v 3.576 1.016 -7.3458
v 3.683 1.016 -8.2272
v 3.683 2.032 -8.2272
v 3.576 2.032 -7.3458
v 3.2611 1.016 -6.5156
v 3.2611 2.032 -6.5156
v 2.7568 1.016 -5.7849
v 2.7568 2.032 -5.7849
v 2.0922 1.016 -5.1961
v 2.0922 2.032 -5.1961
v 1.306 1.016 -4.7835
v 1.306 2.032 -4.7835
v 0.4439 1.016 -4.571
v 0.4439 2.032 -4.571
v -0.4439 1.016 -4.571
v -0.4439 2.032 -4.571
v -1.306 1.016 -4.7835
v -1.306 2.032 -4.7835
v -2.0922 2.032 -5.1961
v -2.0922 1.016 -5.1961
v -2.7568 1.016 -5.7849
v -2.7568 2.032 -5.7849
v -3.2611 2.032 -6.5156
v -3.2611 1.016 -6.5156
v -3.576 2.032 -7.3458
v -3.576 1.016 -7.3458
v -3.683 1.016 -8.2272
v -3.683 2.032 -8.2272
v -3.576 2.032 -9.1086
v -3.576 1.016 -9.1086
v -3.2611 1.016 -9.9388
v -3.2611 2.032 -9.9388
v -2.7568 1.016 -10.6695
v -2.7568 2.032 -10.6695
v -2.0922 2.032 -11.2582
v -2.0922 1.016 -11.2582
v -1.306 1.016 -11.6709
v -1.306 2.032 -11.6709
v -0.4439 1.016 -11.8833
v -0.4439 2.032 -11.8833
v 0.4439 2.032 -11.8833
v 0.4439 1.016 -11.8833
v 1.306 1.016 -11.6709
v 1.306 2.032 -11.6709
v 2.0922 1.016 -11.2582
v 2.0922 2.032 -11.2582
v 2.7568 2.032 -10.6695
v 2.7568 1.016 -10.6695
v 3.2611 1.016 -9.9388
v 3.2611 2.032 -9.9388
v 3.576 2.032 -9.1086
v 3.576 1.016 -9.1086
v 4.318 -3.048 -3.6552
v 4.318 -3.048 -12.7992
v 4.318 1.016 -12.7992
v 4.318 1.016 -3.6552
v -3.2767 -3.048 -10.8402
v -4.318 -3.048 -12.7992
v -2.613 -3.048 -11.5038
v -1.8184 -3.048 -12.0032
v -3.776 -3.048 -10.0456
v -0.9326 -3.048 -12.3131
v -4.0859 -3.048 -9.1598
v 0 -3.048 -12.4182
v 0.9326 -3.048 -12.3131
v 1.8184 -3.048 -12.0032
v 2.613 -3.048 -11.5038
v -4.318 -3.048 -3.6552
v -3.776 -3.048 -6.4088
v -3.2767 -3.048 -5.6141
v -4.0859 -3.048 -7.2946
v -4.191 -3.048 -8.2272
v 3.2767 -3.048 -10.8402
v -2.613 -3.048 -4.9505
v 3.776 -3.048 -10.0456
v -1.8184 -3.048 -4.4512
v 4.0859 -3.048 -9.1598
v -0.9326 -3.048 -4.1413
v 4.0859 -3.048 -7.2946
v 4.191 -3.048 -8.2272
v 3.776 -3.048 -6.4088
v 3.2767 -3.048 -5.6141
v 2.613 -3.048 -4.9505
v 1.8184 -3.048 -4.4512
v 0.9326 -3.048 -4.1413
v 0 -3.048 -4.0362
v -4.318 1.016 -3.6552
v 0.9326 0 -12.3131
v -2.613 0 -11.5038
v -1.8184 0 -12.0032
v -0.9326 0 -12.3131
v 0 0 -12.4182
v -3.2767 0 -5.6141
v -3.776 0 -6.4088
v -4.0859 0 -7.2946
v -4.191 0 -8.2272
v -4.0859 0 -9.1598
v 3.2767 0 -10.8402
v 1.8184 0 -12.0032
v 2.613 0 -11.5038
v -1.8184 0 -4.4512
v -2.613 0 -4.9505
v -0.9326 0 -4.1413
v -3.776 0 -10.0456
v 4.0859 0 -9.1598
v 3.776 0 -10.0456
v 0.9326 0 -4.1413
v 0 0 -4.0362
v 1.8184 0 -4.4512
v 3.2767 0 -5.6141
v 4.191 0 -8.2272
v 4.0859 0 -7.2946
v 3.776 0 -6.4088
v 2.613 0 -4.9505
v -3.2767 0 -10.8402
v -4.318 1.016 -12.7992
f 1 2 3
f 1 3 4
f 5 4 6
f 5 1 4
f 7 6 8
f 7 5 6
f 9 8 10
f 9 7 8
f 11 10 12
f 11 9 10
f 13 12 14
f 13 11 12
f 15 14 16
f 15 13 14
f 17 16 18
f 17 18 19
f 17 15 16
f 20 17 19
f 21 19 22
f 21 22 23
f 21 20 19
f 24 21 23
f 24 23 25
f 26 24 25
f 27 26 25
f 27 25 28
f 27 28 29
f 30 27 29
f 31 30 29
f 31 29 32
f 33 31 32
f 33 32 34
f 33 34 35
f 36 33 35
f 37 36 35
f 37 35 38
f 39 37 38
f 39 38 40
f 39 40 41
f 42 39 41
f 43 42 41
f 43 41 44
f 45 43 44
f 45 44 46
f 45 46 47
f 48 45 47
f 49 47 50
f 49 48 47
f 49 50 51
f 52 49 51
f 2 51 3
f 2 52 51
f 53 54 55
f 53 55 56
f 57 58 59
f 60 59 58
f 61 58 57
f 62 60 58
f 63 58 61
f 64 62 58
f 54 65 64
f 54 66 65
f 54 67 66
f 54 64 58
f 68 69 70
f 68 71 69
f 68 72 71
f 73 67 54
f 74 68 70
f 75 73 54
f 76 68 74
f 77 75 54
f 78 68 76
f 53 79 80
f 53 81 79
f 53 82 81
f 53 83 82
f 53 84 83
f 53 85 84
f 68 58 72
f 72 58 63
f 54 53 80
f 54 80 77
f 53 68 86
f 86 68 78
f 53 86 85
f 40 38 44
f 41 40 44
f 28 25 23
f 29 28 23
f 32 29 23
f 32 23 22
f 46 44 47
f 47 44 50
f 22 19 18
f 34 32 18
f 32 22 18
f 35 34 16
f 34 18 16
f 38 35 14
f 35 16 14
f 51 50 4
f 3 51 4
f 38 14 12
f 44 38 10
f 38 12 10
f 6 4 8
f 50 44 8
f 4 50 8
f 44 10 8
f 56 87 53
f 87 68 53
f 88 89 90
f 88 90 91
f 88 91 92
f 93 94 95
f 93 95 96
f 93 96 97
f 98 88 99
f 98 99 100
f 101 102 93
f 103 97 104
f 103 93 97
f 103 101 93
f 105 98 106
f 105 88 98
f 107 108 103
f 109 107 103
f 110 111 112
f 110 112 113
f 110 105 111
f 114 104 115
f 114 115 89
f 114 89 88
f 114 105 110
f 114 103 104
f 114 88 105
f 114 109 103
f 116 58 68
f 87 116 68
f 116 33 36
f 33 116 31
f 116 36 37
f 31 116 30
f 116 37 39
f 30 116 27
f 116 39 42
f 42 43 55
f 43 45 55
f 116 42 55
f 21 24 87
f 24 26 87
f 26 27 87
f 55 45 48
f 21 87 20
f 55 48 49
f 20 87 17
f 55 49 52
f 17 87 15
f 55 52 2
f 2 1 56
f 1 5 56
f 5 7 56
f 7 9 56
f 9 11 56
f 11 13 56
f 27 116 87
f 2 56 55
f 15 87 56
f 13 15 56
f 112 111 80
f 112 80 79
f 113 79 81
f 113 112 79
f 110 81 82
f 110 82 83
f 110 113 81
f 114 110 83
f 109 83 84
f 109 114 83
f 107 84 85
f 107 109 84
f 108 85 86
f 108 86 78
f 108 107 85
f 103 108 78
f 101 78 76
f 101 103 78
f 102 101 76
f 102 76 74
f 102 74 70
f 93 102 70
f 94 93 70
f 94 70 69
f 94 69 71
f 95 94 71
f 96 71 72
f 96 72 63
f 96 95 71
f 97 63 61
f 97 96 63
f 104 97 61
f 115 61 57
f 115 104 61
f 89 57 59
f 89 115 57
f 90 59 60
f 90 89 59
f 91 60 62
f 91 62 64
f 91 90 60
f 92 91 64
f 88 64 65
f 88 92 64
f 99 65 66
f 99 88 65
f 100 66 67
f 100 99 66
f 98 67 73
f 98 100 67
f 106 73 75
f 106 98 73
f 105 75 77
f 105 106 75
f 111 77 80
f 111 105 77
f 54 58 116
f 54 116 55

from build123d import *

# Parameters (mm, degrees)
F0_W     = 8.636
F0_H     = 9.144
F0_R     = 4.191
F1_DEPTH = 3.048
F0_R_2   = 3.683
F2_DEPTH = 1.016
F3_DEPTH = 2.032


with BuildPart() as f1:
    # F0 (on Front) → F1 (new body)
    with BuildSketch(Plane.XZ):
        with Locations((0, -8.227191)):
            Rectangle(F0_W, F0_H)
        with Locations((0, -8.227191)):
            Circle(F0_R, mode=Mode.SUBTRACT)
    extrude(amount=F1_DEPTH)

    # F0 (on Front) → F2 (join)
    with BuildSketch(Plane.XZ):
        with Locations((0, -8.227191)):
            Rectangle(F0_W, F0_H)
        with Locations((0, -8.227191)):
            Circle(F0_R, mode=Mode.SUBTRACT)
        with Locations((0, -8.227191)):
            Circle(F0_R_2)
        with Locations((0, -8.227191)):
            Circle(F0_R)
        with Locations((0, -8.227191)):
            Circle(F0_R_2, mode=Mode.SUBTRACT)
    extrude(amount=-F2_DEPTH)

    # F0 (on Front) → F3 (join)
    with BuildSketch(Plane.XZ):
        with Locations((0, -8.227191)):
            Circle(F0_R_2)
    extrude(amount=-F3_DEPTH)


solid = f1.part
